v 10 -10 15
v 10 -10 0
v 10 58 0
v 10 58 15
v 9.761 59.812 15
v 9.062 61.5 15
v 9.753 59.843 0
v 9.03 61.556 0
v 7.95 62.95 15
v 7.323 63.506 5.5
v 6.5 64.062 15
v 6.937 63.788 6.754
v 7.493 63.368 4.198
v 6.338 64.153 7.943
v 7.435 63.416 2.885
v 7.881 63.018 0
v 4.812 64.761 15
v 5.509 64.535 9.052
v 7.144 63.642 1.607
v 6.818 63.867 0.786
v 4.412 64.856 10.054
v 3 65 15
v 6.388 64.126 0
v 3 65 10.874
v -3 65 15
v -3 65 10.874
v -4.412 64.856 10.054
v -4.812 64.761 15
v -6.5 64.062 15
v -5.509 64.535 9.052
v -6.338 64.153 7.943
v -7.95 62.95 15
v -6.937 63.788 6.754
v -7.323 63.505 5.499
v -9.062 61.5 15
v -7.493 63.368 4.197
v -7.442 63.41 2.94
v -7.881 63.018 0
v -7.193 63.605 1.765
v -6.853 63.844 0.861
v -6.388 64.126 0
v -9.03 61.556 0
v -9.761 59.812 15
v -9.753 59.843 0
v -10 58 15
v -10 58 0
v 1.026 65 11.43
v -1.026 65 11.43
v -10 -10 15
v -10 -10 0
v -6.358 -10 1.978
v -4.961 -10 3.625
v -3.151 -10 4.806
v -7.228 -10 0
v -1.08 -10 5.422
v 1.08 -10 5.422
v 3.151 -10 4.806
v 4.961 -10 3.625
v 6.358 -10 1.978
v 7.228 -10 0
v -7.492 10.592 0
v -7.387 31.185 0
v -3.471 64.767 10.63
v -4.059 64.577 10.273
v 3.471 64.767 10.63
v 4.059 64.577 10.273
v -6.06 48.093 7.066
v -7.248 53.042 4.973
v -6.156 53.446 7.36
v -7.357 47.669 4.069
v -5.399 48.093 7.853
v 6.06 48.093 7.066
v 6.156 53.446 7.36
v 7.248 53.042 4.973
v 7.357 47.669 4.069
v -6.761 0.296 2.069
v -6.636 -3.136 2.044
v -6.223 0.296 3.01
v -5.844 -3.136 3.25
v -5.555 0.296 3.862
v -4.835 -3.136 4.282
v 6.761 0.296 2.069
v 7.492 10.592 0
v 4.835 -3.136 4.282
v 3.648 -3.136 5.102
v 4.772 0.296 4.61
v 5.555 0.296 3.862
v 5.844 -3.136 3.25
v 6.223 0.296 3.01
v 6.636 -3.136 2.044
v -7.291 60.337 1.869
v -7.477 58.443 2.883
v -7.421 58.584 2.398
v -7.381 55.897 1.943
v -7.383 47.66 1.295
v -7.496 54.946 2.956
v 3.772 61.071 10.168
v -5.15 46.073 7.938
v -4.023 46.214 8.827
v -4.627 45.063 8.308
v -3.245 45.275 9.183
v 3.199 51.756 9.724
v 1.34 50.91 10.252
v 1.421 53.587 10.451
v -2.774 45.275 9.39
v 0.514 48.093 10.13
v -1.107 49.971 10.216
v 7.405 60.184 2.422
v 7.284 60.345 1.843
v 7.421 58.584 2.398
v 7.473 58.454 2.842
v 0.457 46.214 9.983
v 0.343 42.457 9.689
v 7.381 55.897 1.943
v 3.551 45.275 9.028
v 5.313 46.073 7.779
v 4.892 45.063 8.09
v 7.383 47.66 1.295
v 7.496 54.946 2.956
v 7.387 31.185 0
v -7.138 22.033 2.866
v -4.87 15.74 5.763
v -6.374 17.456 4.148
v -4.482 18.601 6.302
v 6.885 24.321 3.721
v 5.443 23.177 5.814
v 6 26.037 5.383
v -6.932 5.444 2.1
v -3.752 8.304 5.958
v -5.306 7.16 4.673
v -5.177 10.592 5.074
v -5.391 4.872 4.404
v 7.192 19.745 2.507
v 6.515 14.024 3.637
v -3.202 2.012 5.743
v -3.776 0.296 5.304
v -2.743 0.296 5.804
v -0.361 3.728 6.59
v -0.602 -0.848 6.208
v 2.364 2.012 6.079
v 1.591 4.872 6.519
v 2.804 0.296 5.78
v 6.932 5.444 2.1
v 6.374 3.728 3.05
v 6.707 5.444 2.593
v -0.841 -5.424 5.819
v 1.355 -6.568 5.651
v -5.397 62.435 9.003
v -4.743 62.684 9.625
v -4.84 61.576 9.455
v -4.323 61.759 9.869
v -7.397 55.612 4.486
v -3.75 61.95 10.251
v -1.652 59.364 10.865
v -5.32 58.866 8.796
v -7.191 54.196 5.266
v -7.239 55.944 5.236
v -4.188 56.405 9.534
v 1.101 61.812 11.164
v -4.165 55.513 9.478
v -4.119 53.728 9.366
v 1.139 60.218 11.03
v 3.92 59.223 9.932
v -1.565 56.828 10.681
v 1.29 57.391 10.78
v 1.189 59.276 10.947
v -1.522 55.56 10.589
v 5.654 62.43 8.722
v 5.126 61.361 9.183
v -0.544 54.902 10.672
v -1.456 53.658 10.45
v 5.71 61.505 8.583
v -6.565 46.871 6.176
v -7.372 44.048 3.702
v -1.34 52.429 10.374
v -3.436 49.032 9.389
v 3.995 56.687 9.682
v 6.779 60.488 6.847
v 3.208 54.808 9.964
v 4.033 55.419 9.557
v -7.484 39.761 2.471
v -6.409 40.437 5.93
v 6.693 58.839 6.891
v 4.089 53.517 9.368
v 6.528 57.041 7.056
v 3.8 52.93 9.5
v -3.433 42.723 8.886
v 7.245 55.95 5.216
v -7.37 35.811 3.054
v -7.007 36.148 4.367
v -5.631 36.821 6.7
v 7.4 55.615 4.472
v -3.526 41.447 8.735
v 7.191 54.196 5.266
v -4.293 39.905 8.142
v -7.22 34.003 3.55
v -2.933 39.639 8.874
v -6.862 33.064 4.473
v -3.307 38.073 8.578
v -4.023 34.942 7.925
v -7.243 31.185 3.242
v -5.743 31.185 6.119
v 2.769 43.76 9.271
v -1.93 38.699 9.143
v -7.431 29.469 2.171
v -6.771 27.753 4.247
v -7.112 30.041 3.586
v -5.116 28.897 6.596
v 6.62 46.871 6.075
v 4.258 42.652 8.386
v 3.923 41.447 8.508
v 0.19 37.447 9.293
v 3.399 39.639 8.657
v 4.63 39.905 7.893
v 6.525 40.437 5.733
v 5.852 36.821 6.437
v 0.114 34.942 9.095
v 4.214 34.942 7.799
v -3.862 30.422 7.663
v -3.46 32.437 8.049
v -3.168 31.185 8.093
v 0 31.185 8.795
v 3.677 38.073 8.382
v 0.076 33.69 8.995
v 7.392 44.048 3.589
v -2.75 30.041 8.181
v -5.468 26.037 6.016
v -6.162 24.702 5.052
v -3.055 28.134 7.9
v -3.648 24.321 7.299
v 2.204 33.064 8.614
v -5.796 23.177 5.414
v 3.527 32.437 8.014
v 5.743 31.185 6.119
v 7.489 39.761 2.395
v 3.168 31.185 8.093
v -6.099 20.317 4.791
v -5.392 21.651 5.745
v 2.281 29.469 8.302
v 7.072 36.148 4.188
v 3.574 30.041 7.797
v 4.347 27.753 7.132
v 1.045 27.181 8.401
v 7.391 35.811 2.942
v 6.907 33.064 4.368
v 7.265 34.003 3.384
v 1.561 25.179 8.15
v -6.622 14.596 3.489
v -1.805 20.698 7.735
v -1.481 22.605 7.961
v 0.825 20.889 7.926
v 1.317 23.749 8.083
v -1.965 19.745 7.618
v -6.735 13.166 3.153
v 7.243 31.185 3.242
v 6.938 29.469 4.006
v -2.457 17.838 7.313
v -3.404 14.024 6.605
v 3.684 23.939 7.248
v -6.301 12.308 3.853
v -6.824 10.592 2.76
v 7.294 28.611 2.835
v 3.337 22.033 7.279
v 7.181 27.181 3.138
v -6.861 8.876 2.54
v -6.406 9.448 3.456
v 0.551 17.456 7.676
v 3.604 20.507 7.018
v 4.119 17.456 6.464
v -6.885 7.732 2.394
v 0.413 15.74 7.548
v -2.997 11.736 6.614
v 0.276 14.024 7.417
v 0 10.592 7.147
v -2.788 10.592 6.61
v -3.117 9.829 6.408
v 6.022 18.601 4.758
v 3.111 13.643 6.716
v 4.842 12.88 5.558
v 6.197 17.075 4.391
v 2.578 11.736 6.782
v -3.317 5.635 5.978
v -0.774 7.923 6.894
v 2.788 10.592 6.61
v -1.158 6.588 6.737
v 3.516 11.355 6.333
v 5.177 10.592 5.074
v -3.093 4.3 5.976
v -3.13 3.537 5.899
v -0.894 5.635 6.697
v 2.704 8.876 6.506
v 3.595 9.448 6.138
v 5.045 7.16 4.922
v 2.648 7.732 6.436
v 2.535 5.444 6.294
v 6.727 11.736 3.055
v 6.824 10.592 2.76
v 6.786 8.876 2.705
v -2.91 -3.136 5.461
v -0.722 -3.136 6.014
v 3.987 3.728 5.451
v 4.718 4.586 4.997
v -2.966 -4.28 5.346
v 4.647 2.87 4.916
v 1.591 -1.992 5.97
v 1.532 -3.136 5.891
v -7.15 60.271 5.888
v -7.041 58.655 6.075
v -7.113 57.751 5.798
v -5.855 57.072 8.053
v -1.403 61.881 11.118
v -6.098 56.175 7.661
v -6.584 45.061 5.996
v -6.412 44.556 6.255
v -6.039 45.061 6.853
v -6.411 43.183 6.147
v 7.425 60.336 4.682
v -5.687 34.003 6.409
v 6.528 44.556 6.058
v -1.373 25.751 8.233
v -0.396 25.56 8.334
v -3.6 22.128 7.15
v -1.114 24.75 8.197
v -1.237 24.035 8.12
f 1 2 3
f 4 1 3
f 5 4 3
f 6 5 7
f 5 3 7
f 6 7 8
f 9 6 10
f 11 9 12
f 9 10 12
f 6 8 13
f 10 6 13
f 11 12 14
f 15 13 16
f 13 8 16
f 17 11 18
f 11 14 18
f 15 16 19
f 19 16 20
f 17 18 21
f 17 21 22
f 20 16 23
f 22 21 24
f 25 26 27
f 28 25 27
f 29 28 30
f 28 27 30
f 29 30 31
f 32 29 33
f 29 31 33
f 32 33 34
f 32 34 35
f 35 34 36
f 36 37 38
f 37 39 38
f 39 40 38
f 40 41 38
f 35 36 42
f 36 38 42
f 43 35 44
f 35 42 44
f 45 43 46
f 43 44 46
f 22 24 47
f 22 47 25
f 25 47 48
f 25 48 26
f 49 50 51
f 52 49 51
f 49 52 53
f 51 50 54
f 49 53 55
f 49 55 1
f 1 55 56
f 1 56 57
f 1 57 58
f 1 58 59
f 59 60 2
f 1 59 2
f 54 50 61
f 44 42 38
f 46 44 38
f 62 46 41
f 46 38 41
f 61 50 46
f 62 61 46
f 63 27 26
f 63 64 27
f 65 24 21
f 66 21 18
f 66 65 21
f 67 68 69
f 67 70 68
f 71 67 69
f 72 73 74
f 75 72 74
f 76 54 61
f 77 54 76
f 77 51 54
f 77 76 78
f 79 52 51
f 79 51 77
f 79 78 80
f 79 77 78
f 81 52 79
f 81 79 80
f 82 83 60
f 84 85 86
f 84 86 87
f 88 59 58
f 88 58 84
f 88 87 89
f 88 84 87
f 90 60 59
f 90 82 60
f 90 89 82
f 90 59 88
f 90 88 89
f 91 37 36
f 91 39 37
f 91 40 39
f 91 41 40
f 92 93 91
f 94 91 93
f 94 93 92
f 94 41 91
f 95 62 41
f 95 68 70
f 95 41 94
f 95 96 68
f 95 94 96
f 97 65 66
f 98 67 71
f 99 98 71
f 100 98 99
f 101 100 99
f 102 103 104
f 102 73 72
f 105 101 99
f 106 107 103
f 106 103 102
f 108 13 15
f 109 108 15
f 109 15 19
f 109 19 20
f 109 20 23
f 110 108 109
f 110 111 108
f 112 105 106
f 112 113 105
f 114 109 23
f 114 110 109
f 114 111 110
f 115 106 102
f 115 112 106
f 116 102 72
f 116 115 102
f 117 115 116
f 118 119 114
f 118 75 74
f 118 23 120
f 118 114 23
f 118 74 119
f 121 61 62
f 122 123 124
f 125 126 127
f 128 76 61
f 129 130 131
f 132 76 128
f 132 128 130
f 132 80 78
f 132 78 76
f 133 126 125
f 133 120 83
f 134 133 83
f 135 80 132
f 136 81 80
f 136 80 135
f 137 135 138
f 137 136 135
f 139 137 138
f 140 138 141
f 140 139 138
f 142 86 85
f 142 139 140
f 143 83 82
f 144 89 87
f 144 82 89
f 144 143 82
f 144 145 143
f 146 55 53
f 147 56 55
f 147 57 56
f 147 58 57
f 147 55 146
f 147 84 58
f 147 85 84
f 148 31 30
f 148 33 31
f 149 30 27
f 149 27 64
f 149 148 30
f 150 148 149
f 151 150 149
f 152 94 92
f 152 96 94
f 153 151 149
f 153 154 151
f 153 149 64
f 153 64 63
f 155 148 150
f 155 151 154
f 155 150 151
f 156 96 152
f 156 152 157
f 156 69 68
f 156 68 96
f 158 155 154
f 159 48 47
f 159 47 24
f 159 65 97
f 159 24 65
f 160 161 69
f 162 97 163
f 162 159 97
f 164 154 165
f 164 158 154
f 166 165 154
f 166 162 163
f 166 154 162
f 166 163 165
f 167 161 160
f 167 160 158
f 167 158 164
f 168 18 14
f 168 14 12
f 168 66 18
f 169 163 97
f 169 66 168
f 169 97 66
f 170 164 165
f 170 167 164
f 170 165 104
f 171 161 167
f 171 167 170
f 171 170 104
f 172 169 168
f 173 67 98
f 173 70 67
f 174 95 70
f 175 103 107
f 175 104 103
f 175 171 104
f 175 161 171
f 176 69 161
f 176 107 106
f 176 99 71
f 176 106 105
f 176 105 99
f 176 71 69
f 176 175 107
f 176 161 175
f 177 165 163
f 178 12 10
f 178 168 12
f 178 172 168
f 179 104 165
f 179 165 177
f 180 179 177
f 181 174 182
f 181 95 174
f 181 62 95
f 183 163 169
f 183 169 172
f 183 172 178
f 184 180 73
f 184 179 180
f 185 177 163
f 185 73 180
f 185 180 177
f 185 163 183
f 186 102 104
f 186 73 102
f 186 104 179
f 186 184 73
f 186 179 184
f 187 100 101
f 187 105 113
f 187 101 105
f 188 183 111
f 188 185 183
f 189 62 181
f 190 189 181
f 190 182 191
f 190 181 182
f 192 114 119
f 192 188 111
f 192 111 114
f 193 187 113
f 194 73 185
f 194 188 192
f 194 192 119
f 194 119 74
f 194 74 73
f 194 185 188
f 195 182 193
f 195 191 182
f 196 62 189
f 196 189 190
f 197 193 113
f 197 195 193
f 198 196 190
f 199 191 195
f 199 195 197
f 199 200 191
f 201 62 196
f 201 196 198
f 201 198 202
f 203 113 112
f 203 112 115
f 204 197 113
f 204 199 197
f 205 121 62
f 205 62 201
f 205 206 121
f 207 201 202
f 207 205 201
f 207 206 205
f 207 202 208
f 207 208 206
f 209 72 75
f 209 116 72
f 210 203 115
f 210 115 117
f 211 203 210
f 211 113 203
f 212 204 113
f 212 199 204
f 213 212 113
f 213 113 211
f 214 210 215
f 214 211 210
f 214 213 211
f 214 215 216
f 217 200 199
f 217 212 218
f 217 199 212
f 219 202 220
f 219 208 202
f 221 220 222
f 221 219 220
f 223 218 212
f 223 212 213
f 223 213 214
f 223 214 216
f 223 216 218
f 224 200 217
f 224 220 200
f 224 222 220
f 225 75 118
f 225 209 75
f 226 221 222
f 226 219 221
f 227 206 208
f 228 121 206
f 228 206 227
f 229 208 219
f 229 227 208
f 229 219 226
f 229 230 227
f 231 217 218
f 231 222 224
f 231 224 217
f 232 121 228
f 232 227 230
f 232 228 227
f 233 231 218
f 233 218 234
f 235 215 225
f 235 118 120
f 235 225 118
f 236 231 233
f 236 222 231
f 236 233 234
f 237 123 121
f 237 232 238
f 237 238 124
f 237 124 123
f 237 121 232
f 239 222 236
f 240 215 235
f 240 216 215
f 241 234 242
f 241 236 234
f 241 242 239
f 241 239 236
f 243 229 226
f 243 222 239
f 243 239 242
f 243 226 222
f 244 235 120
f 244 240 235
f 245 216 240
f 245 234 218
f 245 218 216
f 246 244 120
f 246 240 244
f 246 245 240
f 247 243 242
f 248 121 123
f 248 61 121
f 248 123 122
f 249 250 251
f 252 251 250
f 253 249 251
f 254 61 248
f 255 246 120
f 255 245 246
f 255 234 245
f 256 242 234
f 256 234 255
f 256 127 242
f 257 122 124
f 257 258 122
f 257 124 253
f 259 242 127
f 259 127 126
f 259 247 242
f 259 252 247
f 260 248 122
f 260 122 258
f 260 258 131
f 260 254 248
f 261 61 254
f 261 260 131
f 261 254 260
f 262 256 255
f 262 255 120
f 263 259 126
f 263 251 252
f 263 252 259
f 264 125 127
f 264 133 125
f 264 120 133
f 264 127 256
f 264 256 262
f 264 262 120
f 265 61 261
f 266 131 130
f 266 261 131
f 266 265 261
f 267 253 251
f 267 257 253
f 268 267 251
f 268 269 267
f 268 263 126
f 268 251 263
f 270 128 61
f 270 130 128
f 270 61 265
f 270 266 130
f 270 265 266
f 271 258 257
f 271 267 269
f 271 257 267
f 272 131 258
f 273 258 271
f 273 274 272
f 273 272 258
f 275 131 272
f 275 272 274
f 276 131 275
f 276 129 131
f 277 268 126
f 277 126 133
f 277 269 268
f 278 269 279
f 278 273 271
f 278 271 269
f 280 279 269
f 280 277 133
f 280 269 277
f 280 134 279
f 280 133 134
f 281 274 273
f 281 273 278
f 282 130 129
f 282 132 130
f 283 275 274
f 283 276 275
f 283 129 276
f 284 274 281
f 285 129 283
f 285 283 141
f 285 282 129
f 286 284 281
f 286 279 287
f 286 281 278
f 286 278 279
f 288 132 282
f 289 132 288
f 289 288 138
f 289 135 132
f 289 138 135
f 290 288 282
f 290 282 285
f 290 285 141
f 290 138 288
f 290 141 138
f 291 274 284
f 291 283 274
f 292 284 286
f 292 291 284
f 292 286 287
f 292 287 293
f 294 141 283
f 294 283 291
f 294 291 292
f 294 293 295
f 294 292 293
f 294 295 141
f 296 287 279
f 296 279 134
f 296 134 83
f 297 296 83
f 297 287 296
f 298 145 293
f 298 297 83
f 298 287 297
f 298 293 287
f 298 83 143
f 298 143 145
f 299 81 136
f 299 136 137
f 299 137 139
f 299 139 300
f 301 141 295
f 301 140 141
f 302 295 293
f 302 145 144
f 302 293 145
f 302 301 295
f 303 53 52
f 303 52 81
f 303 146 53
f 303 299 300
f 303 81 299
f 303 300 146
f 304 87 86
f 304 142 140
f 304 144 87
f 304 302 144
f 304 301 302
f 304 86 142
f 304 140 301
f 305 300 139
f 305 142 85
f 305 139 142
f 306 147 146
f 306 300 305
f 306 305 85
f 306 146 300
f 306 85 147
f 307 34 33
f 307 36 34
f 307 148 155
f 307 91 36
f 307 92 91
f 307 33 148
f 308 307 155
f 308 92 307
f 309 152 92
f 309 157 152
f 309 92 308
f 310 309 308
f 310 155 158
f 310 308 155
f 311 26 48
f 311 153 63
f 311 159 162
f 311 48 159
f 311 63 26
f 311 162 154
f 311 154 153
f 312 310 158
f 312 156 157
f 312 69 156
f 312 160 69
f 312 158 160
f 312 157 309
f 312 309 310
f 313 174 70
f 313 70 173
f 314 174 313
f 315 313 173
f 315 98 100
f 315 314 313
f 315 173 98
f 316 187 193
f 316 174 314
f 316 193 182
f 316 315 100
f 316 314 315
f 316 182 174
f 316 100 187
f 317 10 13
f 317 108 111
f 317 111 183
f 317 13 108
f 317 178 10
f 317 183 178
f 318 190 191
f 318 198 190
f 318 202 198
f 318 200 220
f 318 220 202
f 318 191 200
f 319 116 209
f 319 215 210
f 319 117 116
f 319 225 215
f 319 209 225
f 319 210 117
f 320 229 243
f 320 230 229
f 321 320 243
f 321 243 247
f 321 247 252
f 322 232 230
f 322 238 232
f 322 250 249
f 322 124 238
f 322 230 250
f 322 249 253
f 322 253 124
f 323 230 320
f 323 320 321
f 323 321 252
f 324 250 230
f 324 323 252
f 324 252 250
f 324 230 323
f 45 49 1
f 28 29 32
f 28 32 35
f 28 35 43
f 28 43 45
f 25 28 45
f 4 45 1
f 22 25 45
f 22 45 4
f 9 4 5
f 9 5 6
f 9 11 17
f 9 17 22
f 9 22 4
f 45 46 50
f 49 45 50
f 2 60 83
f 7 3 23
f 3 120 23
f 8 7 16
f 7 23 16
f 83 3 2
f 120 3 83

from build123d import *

# Parameters (mm, degrees)
F1_DEPTH = 15
F2_R     = 7.5


with BuildPart() as f1:
    # F0 (on Top) → F1 (new body)
    with BuildSketch(Plane.XY):
        with BuildLine():
            Line((-10, 58), (-10, -10))
            Line((-10, -10), (10, -10))
            Line((10, -10), (10, 58))
            ThreePointArc((10, 58), (7.9497474683, 62.9497474683), (3, 65))
            Line((3, 65), (-3, 65))
            ThreePointArc((-3, 65), (-7.9497474683, 62.9497474683), (-10, 58))
        make_face()
    extrude(amount=F1_DEPTH)

    # F4: sweep along a path in F3
    with BuildLine(Plane.YZ) as f4_path:
        Line((65, 5), (-10, -1))
    # F2 (on face) → F4 (sweep, cut)
    with BuildSketch(Plane(origin=(0, 65, 0), x_dir=(-1, 0, 0), z_dir=(0, 1, 0))):
        with Locations((0, 4)):
            Circle(F2_R)
    sweep(path=f4_path.line, mode=Mode.SUBTRACT)


solid = f1.part
